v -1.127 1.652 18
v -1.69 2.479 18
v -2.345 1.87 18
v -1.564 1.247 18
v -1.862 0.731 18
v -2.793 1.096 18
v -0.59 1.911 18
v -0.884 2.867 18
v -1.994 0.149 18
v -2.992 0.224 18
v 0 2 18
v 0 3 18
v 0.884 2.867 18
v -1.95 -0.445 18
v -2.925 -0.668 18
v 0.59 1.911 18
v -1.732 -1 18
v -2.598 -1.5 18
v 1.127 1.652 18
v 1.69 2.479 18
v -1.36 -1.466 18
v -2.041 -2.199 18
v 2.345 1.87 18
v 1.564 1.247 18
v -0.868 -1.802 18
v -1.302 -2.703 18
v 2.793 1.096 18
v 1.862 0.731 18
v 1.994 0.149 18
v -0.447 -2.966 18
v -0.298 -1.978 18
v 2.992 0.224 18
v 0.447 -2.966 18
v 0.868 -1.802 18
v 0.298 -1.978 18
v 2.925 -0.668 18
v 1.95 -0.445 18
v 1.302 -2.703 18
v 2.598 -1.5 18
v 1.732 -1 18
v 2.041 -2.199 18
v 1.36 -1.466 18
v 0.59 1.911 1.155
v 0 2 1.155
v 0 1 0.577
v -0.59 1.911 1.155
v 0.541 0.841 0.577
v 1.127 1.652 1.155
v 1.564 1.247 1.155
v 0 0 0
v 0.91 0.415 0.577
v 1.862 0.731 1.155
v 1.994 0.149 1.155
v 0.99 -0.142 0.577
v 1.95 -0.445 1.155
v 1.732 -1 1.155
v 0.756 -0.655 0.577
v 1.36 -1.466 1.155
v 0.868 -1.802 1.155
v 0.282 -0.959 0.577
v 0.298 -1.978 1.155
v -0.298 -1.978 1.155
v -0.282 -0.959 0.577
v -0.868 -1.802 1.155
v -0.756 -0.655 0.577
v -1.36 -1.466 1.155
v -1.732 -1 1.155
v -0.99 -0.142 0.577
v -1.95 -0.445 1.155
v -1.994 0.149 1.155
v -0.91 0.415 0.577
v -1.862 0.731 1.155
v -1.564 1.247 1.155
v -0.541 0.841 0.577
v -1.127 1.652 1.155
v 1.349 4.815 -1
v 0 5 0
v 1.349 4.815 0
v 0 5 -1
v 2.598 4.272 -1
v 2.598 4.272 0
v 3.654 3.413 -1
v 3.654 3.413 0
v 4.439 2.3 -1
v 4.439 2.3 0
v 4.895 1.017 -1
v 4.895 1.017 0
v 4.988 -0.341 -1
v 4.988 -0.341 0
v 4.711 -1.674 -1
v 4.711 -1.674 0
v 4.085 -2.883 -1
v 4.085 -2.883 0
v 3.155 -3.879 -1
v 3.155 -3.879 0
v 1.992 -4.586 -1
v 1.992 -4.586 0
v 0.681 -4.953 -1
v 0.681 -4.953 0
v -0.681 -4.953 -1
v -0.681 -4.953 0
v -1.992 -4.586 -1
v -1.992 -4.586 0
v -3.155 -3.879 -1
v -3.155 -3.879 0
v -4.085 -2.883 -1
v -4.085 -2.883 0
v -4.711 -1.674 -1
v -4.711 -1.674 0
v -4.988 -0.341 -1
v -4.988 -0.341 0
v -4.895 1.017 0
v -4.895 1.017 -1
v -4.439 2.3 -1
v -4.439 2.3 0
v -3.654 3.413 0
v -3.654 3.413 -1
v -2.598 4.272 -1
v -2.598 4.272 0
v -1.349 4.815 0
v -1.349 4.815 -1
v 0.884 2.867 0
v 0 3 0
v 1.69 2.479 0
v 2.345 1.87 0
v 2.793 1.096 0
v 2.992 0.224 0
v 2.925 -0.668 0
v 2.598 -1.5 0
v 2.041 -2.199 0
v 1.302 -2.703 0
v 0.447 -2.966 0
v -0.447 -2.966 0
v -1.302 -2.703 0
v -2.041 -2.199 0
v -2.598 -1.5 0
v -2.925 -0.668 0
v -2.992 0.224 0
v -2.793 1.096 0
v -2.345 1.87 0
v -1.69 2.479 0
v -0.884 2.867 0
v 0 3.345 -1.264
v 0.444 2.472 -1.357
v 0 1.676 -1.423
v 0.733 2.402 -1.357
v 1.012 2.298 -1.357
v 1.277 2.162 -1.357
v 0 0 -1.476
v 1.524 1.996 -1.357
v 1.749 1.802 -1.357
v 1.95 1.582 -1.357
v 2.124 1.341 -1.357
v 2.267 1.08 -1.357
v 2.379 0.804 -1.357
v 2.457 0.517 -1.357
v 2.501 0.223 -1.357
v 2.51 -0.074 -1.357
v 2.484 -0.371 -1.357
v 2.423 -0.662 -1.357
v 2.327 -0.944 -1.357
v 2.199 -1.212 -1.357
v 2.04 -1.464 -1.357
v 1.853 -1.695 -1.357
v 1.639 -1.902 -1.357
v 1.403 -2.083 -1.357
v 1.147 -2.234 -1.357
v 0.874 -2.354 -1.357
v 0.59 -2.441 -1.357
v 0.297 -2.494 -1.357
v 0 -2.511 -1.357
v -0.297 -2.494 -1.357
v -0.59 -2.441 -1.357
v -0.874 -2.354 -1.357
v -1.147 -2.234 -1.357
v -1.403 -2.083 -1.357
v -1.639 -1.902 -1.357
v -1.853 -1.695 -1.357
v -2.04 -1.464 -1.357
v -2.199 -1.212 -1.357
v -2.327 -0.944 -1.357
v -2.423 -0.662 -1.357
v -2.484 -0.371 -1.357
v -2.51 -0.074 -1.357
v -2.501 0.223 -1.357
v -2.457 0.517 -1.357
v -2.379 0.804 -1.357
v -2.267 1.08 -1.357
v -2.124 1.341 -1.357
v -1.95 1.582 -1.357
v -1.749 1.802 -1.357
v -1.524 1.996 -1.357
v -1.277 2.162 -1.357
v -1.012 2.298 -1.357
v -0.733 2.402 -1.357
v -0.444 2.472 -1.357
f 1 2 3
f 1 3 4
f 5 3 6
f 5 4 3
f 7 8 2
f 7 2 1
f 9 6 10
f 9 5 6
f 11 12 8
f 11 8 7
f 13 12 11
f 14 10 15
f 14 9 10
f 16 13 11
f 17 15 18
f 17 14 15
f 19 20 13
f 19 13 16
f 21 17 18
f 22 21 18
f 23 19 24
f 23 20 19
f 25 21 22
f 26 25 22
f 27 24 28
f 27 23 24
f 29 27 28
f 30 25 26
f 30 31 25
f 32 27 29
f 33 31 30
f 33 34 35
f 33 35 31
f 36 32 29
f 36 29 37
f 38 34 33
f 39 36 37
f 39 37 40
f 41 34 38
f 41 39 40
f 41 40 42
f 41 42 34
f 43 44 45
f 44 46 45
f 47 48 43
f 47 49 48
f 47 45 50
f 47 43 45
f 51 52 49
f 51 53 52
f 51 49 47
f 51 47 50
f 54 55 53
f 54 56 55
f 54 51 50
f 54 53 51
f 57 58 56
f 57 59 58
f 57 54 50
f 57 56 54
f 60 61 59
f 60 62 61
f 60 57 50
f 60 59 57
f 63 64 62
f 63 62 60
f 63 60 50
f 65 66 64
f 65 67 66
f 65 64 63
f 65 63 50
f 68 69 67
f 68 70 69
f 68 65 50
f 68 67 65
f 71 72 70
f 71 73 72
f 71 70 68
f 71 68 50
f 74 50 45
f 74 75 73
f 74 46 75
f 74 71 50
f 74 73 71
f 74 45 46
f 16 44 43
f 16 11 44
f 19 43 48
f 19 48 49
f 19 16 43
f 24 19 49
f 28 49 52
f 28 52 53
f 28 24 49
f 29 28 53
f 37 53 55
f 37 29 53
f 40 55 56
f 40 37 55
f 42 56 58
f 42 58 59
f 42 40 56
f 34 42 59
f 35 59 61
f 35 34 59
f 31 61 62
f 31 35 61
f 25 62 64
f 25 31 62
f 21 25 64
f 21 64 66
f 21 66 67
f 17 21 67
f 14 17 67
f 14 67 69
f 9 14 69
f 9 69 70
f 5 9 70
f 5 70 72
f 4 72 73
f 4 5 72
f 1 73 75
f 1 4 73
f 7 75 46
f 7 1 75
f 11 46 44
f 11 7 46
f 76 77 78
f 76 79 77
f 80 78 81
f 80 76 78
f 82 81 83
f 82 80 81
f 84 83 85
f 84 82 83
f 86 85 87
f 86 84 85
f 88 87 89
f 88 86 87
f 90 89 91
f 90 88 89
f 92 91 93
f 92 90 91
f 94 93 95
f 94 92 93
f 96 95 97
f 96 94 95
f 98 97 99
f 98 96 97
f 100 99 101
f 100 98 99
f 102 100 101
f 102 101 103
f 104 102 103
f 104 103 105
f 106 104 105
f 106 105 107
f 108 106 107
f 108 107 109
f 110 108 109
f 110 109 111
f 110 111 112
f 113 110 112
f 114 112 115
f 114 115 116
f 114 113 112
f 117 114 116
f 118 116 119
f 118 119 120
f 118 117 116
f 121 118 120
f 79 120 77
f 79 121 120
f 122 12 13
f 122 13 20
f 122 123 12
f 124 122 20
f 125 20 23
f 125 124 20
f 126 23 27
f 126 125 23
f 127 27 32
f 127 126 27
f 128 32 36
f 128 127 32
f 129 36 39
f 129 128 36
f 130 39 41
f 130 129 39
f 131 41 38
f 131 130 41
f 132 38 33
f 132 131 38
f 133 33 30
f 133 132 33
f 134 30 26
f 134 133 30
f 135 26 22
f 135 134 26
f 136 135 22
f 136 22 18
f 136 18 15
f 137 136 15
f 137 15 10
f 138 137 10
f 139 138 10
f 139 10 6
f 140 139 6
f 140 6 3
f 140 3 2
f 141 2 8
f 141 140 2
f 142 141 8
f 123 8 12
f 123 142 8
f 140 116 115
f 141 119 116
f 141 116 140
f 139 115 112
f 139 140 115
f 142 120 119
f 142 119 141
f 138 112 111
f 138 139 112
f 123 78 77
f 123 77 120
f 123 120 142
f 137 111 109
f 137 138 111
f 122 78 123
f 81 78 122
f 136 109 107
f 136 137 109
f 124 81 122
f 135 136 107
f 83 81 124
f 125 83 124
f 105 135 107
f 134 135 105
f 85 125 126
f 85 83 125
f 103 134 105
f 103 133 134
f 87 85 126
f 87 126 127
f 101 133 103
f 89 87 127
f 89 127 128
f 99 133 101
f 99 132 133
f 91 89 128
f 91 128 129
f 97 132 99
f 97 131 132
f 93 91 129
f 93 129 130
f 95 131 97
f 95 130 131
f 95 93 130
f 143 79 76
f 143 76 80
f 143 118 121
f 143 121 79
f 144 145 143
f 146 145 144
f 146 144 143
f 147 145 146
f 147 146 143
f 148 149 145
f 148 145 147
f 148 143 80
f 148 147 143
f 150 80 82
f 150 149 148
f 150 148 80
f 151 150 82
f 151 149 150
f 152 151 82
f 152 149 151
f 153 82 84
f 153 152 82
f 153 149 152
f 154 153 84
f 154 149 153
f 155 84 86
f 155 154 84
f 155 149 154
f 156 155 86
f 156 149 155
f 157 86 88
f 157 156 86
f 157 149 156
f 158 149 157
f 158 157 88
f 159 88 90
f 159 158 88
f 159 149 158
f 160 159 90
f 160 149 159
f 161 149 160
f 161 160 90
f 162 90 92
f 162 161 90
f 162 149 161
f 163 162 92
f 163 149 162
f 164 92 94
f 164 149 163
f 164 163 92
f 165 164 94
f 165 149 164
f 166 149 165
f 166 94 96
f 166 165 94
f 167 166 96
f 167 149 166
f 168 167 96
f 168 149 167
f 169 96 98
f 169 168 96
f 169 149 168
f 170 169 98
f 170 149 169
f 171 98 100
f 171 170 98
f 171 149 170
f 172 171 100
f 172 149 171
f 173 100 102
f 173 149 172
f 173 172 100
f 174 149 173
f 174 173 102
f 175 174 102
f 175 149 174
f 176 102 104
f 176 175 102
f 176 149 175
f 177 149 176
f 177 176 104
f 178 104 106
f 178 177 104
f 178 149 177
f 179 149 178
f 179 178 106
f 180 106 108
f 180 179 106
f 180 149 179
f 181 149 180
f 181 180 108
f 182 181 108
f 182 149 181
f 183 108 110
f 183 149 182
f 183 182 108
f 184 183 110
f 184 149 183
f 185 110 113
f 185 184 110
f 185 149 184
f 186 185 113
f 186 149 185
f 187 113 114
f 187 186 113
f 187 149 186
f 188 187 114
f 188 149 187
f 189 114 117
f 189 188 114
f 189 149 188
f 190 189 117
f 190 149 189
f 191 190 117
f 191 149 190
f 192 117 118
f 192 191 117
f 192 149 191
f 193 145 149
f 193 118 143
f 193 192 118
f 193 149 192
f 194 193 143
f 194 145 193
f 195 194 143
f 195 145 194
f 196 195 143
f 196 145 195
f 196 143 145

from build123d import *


with BuildPart() as part:
    # Esquisse1 → Révolution1 (revolve)
    with BuildSketch(Plane(origin=(0, 0, 0), x_dir=(0, 0, -1), z_dir=(1, 0, 0))):
        with BuildLine():
            Line((-18, 3), (0, 3))
            Line((0, 3), (0, 5))
            Line((0, 5), (1, 5))
            ThreePointArc((1, 5), (1.357034349, 2.511322427), (1.47640459, 0))
            Line((1.47640459, 0), (0, 0))
            Line((0, 0), (-1.154700538, 2))
            Line((-1.154700538, 2), (-18, 2))
            Line((-18, 2), (-18, 3))
        make_face()
    revolve(axis=Axis((0, 0, 27.655172414), (0, 0, -1)))


solid = part.part
